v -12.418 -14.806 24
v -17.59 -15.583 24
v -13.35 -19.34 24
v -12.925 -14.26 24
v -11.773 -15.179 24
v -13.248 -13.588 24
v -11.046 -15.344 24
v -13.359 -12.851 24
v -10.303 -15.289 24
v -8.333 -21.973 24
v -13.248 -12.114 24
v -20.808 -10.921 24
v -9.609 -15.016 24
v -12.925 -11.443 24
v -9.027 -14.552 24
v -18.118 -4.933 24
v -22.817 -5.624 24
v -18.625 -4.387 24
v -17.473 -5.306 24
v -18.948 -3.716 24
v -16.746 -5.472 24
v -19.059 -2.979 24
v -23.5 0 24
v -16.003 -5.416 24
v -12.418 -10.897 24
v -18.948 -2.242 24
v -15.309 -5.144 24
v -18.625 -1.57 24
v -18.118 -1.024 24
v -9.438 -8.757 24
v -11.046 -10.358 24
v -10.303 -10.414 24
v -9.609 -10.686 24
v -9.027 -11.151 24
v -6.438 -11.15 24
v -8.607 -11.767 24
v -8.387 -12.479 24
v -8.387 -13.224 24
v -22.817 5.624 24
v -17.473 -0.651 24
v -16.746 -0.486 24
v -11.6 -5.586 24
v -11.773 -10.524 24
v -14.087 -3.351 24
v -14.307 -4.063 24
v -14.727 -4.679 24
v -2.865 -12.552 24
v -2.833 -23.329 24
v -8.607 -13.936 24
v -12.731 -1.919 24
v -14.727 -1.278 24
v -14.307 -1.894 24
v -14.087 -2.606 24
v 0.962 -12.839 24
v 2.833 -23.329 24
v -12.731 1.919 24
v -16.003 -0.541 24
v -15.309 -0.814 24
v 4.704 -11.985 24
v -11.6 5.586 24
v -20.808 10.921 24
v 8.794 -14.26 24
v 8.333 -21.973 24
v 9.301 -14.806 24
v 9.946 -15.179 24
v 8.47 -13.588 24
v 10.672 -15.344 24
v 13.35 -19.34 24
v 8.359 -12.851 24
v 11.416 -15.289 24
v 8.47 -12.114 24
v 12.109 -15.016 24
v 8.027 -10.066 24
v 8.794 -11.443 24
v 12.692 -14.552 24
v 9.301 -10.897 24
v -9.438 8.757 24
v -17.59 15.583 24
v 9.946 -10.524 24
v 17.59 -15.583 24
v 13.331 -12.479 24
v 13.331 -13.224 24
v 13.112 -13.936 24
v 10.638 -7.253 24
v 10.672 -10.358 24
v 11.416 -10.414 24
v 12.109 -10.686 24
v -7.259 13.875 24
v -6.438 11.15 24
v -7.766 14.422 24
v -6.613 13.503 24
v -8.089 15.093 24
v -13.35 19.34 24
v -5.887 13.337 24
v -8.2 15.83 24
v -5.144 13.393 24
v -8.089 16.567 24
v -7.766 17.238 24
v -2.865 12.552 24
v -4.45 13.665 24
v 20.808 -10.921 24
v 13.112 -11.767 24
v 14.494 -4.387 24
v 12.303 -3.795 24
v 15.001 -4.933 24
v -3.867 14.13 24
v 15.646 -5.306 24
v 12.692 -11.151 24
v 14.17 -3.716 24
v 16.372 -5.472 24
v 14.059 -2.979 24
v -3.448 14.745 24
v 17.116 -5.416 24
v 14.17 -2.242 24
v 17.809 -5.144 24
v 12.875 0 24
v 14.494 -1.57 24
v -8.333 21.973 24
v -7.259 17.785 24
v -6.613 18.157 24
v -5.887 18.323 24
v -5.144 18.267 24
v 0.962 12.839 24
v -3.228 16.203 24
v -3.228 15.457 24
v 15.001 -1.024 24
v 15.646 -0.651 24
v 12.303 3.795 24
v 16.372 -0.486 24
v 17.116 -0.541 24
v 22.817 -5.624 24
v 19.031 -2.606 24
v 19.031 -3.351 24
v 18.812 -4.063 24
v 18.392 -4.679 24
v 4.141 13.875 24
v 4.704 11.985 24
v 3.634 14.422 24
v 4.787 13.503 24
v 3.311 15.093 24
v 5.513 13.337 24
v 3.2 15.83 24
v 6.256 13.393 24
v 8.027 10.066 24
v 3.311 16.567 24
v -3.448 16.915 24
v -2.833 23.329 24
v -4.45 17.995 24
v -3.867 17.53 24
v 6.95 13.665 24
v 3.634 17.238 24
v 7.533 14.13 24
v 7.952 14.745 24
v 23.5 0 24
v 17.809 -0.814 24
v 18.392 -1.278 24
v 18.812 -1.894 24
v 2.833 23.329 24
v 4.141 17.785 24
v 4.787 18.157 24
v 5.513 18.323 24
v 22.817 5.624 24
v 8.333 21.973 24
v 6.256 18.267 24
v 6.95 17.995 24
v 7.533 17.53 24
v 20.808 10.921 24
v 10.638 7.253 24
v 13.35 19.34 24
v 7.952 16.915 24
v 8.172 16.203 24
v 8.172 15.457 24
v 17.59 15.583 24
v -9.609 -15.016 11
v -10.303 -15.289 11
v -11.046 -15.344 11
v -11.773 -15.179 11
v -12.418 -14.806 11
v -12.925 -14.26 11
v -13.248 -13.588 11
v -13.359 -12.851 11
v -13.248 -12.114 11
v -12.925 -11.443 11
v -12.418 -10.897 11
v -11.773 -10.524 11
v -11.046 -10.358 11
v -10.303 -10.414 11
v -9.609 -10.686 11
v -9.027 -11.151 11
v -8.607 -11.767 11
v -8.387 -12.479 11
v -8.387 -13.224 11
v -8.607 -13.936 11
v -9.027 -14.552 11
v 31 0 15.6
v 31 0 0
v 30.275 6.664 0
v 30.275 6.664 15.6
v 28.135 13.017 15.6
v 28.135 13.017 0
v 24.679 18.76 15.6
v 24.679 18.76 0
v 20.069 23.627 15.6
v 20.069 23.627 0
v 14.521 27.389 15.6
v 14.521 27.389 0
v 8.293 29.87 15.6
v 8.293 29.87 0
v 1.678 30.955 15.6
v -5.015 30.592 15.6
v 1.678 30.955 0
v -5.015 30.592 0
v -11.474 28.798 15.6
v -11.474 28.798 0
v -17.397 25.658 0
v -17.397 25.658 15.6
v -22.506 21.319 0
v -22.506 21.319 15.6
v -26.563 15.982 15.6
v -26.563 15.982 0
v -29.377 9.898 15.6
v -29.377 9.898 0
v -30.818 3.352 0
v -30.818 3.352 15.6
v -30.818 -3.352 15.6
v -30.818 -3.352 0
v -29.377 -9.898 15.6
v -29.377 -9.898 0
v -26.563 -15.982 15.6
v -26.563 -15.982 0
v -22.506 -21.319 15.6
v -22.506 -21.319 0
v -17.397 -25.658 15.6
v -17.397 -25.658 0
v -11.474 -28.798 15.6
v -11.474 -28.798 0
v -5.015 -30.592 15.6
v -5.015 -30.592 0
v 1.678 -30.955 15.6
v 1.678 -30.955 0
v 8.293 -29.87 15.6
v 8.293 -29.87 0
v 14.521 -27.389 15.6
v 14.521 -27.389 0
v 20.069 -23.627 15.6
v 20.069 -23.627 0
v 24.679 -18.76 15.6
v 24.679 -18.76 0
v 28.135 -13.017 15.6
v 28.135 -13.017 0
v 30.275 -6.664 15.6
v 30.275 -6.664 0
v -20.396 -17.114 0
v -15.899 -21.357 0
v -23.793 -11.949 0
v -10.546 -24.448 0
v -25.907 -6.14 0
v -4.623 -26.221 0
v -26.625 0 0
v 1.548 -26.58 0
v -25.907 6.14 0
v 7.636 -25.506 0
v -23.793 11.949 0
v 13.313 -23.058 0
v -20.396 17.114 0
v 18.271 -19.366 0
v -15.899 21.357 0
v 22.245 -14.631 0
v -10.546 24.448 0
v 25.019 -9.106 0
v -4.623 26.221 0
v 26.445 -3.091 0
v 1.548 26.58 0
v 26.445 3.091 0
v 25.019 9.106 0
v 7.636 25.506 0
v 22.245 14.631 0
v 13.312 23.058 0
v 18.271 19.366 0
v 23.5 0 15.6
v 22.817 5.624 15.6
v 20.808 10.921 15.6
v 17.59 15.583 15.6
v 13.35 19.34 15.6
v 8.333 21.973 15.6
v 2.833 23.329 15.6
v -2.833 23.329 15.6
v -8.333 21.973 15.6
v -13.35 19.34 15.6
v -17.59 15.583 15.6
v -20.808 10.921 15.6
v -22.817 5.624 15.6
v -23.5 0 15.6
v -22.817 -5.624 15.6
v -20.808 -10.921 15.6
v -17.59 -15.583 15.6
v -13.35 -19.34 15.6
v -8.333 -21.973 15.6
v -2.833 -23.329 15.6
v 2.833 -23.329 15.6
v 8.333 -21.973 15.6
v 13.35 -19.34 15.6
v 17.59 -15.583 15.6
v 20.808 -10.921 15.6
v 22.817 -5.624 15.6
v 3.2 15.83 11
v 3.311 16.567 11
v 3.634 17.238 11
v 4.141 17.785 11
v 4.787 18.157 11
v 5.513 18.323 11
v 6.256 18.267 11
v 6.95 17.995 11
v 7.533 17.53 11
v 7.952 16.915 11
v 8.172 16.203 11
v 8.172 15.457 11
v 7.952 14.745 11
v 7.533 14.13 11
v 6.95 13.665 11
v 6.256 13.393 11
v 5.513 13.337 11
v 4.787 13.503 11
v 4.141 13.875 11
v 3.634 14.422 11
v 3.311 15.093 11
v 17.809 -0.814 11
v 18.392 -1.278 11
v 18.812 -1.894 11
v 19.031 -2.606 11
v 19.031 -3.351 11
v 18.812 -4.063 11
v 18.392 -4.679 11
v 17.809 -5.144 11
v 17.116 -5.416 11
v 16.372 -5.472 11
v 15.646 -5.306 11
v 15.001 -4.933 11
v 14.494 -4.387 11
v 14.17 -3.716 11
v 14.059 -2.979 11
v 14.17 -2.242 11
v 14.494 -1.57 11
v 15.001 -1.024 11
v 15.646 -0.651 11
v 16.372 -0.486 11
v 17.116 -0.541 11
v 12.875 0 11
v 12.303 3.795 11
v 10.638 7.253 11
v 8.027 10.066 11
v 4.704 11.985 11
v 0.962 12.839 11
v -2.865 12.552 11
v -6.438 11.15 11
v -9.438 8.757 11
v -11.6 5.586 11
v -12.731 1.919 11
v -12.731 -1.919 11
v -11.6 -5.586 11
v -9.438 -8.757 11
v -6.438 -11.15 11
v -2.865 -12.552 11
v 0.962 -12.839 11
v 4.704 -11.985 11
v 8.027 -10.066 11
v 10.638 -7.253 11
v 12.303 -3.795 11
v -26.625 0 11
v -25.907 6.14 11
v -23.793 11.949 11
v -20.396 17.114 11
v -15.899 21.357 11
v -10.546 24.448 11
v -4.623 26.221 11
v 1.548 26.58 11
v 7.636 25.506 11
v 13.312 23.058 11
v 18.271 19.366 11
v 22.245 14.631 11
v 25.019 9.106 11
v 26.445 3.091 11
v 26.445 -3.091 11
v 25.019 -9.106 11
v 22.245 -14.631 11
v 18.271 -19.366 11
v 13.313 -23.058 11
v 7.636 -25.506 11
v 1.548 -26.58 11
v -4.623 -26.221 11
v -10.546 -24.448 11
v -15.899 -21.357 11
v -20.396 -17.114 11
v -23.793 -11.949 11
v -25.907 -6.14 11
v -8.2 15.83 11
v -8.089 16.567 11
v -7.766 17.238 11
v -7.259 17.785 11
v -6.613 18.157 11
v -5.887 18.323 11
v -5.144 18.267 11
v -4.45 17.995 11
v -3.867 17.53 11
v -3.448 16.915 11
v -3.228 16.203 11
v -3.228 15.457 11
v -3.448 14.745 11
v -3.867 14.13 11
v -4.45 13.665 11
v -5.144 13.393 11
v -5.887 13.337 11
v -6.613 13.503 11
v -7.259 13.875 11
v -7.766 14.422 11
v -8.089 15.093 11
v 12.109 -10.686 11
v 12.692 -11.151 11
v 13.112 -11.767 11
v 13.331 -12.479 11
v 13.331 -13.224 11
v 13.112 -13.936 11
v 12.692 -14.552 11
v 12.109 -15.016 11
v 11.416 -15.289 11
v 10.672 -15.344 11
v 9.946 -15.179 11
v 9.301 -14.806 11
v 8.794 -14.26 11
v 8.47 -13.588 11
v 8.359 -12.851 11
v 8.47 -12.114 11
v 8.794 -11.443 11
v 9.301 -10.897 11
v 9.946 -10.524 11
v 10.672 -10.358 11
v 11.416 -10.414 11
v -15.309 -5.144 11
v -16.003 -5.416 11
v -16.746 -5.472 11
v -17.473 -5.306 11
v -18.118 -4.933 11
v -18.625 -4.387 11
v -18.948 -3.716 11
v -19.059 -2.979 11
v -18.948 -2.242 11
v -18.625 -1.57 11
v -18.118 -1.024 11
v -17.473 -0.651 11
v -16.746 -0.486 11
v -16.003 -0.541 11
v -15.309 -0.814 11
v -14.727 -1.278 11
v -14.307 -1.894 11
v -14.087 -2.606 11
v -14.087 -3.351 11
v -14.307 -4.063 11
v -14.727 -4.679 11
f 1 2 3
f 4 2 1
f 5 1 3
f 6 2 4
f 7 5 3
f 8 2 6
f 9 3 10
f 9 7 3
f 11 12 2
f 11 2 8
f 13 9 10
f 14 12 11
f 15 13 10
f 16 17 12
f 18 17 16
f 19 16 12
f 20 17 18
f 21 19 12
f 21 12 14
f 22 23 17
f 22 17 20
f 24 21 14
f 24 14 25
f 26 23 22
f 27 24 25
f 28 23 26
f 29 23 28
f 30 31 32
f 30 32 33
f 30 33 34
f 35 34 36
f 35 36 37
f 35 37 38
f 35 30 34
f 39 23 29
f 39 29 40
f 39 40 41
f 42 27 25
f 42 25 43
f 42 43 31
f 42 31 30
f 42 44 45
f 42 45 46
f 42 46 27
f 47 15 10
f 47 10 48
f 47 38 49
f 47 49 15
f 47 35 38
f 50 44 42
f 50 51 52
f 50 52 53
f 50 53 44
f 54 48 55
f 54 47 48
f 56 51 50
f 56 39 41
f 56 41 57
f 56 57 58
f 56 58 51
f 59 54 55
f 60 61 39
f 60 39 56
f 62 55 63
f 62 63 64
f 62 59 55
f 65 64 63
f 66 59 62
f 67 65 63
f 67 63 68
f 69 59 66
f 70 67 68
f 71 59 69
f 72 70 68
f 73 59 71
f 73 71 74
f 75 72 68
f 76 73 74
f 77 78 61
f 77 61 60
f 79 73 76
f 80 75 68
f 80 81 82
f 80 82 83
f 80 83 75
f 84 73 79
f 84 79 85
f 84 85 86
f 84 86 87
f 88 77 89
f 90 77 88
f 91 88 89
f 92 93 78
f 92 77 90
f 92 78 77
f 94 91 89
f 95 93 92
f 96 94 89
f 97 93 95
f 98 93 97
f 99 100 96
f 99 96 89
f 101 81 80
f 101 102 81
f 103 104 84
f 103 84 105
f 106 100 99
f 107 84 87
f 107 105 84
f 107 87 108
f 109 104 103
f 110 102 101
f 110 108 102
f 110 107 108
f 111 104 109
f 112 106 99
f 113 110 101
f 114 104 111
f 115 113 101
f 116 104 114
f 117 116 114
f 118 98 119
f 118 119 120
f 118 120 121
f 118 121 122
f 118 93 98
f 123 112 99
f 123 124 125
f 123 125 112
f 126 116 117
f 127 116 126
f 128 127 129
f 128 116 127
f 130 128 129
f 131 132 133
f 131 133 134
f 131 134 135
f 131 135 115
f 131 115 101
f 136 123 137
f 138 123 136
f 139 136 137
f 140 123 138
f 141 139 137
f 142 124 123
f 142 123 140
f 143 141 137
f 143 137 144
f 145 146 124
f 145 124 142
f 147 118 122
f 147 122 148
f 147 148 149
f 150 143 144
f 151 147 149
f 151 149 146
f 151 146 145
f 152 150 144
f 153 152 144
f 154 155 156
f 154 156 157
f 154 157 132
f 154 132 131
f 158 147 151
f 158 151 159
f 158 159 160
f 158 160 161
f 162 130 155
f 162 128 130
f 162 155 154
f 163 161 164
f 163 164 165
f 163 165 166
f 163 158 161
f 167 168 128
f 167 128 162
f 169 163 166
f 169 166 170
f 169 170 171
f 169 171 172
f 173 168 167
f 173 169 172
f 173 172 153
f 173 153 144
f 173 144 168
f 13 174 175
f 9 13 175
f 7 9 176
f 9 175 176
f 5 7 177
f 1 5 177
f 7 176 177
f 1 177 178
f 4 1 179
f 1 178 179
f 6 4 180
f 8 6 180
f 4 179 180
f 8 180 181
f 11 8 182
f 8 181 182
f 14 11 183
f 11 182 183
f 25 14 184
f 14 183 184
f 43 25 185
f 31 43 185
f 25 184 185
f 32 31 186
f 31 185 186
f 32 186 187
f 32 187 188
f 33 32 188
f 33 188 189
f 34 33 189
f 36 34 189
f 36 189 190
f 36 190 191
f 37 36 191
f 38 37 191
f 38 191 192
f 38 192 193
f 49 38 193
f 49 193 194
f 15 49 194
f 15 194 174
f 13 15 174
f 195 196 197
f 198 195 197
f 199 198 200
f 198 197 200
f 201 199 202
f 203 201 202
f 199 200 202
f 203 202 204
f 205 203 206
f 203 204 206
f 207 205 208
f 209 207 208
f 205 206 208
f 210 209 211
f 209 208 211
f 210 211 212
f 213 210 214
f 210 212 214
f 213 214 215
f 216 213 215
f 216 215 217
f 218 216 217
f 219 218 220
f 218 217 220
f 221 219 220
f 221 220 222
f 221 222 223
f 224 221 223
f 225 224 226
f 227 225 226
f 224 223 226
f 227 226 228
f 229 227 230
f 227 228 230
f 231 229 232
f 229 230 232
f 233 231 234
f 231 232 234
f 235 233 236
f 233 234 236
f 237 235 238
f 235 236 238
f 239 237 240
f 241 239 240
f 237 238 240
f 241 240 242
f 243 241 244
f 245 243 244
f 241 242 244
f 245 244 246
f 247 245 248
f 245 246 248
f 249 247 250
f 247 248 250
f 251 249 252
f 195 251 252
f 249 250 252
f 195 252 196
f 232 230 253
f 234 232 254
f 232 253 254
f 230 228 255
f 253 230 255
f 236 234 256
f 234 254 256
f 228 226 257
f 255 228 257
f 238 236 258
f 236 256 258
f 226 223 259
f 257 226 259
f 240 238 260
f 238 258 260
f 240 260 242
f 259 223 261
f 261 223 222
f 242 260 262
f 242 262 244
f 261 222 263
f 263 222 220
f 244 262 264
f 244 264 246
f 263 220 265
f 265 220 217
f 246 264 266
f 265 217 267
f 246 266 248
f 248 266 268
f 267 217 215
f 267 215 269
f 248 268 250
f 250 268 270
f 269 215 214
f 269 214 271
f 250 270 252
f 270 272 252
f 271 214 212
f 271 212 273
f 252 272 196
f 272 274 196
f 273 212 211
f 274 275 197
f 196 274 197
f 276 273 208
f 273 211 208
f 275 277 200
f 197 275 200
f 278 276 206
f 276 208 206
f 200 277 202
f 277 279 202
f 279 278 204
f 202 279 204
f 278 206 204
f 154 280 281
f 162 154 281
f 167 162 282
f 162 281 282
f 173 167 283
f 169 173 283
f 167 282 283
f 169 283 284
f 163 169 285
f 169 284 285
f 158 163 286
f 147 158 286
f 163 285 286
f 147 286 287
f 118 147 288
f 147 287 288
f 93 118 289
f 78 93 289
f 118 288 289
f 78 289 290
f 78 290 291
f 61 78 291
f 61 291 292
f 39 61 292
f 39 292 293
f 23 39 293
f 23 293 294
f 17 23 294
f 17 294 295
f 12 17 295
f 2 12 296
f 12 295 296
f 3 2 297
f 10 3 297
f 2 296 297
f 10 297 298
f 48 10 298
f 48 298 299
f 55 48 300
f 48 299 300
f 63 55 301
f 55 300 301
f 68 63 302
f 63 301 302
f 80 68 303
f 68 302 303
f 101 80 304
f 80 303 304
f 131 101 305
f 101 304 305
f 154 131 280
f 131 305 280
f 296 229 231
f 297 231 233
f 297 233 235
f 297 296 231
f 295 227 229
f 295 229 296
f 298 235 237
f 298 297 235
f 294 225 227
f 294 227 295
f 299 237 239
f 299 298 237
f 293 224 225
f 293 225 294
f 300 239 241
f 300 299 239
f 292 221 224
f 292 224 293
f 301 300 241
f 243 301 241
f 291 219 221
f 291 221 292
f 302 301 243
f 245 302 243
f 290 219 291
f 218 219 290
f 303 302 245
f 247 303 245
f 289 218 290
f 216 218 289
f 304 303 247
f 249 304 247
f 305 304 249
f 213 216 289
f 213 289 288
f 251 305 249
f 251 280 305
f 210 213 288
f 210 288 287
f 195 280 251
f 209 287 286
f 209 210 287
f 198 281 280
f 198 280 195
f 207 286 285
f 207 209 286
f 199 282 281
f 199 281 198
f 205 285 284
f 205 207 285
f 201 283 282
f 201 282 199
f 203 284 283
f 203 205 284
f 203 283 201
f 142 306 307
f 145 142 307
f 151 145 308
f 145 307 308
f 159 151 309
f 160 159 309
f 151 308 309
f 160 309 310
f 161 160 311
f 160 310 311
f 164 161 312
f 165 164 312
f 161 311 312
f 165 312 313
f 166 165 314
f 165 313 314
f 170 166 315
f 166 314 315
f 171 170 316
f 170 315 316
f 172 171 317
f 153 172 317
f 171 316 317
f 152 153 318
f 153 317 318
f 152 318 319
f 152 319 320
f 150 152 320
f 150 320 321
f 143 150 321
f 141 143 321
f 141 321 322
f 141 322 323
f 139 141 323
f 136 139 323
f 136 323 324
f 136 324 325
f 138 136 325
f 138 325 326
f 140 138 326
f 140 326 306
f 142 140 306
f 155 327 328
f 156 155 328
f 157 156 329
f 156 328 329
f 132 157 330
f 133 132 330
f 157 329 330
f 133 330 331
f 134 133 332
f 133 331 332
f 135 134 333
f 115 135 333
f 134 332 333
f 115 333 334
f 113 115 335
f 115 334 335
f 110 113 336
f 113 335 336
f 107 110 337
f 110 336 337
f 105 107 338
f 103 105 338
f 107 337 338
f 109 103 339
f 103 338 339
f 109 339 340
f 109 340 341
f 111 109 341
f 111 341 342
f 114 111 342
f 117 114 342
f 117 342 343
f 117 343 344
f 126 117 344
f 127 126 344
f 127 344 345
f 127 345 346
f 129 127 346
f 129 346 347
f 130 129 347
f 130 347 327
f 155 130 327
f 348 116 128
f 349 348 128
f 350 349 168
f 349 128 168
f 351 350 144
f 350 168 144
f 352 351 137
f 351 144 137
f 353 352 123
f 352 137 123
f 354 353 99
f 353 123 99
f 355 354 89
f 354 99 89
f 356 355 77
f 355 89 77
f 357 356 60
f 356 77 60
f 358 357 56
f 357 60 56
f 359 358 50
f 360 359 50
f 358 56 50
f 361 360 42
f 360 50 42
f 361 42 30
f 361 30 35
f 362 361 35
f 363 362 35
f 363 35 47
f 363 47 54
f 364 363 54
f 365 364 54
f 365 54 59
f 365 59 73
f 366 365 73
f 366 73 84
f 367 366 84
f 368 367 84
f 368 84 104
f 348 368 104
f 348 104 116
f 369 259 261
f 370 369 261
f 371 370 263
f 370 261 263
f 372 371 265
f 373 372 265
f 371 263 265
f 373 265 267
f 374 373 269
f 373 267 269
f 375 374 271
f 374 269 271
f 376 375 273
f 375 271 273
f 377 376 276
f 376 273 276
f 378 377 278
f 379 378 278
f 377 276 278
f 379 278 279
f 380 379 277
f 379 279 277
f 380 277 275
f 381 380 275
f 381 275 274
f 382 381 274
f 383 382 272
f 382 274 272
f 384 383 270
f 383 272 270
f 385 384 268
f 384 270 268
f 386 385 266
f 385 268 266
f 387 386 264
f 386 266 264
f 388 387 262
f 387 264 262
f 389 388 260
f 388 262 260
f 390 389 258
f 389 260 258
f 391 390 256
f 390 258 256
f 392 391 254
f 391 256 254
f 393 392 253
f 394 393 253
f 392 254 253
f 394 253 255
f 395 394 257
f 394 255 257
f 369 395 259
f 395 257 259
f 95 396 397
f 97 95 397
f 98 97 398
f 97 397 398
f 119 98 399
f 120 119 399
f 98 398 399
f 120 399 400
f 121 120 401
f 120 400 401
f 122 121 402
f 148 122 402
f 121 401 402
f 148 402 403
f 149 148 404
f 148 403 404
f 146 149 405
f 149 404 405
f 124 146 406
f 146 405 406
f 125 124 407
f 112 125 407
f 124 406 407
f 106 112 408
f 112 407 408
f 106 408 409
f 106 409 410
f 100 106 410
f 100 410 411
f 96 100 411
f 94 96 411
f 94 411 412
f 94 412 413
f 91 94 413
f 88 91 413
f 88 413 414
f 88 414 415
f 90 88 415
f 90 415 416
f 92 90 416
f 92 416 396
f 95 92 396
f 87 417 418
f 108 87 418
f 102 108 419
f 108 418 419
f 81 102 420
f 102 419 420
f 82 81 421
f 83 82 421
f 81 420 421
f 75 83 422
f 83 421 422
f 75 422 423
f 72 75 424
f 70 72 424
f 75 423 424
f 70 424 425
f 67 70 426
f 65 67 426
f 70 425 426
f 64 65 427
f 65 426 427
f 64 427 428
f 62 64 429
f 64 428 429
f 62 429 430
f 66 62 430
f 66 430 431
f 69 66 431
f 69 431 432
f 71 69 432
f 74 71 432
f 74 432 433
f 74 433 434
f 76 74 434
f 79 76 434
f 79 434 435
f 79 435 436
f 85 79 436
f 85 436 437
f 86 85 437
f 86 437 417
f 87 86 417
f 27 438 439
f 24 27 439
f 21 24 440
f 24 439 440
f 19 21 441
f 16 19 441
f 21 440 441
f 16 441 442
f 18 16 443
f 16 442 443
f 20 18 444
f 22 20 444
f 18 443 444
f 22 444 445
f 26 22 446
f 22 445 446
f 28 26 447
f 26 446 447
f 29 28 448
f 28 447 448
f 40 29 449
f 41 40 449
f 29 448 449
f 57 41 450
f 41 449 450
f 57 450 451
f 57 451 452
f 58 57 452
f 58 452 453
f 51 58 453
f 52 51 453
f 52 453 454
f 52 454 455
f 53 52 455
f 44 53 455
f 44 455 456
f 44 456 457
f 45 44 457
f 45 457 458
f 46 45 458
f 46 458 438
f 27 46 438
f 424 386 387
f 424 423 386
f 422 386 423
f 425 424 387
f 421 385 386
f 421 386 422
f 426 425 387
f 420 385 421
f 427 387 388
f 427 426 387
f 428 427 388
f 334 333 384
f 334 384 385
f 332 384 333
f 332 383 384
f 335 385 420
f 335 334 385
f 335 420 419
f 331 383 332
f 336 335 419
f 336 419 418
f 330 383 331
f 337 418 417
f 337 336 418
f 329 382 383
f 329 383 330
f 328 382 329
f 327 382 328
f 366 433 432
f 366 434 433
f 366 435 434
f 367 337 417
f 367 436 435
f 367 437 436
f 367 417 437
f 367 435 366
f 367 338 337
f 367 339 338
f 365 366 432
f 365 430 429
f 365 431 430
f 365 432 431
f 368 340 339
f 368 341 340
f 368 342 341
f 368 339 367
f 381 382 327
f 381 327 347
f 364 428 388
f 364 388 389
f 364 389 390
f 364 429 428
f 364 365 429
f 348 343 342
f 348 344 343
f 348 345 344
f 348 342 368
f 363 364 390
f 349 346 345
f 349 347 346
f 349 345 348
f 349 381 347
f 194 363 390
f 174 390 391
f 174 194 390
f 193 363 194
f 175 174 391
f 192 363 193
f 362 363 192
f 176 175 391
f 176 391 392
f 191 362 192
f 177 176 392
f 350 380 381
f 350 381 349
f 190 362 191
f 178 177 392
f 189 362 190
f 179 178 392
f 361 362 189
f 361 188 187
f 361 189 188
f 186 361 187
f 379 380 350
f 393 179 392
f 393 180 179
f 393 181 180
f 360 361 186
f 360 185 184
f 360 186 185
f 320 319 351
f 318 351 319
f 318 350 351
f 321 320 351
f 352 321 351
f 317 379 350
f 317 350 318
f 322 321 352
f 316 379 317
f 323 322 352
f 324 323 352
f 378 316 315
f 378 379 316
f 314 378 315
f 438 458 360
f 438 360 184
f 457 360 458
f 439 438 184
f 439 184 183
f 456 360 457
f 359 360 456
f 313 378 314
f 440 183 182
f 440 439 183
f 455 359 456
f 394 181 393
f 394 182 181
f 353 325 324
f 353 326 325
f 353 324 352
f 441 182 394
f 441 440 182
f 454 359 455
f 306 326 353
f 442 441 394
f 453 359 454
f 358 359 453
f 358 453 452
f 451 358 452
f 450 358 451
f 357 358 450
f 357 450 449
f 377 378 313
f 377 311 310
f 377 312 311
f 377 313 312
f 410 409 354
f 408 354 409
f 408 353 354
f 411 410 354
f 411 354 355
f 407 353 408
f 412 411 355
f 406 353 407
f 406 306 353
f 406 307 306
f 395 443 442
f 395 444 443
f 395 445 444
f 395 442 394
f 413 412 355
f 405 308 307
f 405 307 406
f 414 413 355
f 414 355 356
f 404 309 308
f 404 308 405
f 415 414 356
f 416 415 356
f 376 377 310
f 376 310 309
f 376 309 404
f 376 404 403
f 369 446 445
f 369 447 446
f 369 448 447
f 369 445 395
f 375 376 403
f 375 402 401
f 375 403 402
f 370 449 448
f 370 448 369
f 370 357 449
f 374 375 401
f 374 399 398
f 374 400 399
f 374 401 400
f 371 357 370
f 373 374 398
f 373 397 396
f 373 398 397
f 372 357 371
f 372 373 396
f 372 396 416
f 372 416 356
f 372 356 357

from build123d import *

# Parameters (mm, degrees)
SKETCH1_R             = 31
BOSS_EXTRUDE1_DEPTH   = 15.6
SKETCH2_R             = 23.5
BOSS_EXTRUDE2_DEPTH   = 8.4
SKETCH3_R             = 12.875
CUT_EXTRUDE1_DEPTH    = 50.979995998
SKETCH4_R             = 26.625
CUT_EXTRUDE2_DEPTH    = 11
M6X1_0_TAPPED_HOLE1_D = 5
CIRPATTERN1_COUNT     = 3


with BuildPart() as part:
    # Sketch1 → Boss-Extrude1 (new body)
    with BuildSketch(Plane.XY):
        Circle(SKETCH1_R)
    extrude(amount=BOSS_EXTRUDE1_DEPTH)

    # Sketch2 → Boss-Extrude2 (add)
    with BuildSketch(Plane.XY.offset(15.6)):
        Circle(SKETCH2_R)
    extrude(amount=BOSS_EXTRUDE2_DEPTH)

    # Sketch3 → Cut-Extrude1 (cut, through all)
    with BuildSketch(Plane.XY.offset(24)):
        Circle(SKETCH3_R)
    extrude(amount=-CUT_EXTRUDE1_DEPTH, mode=Mode.SUBTRACT)

    # Sketch4 → Cut-Extrude2 (cut)
    with BuildSketch(Plane(origin=(0, 0, 0), x_dir=(-1, 0, 0), z_dir=(0, 0, -1))):
        Circle(SKETCH4_R)
    extrude(amount=-CUT_EXTRUDE2_DEPTH, mode=Mode.SUBTRACT)

    # M6x1.0 Tapped Hole1 (through all)
    with Locations(Plane.XY.offset(24)):
        with Locations((-5.7, 15.830054485), (5.7, 15.830054485)):
            m6x1_0_tapped_hole1 = Hole(M6X1_0_TAPPED_HOLE1_D / 2)

    # CirPattern1: M6x1.0 Tapped Hole1 ×3 about axis
    cirpattern1_axis = Axis((0, 0, 0), (0, 0, 1))
    for i in range(1, CIRPATTERN1_COUNT):
        add(m6x1_0_tapped_hole1.rotate(cirpattern1_axis, i * 360 / CIRPATTERN1_COUNT), mode=Mode.SUBTRACT)


solid = part.part
